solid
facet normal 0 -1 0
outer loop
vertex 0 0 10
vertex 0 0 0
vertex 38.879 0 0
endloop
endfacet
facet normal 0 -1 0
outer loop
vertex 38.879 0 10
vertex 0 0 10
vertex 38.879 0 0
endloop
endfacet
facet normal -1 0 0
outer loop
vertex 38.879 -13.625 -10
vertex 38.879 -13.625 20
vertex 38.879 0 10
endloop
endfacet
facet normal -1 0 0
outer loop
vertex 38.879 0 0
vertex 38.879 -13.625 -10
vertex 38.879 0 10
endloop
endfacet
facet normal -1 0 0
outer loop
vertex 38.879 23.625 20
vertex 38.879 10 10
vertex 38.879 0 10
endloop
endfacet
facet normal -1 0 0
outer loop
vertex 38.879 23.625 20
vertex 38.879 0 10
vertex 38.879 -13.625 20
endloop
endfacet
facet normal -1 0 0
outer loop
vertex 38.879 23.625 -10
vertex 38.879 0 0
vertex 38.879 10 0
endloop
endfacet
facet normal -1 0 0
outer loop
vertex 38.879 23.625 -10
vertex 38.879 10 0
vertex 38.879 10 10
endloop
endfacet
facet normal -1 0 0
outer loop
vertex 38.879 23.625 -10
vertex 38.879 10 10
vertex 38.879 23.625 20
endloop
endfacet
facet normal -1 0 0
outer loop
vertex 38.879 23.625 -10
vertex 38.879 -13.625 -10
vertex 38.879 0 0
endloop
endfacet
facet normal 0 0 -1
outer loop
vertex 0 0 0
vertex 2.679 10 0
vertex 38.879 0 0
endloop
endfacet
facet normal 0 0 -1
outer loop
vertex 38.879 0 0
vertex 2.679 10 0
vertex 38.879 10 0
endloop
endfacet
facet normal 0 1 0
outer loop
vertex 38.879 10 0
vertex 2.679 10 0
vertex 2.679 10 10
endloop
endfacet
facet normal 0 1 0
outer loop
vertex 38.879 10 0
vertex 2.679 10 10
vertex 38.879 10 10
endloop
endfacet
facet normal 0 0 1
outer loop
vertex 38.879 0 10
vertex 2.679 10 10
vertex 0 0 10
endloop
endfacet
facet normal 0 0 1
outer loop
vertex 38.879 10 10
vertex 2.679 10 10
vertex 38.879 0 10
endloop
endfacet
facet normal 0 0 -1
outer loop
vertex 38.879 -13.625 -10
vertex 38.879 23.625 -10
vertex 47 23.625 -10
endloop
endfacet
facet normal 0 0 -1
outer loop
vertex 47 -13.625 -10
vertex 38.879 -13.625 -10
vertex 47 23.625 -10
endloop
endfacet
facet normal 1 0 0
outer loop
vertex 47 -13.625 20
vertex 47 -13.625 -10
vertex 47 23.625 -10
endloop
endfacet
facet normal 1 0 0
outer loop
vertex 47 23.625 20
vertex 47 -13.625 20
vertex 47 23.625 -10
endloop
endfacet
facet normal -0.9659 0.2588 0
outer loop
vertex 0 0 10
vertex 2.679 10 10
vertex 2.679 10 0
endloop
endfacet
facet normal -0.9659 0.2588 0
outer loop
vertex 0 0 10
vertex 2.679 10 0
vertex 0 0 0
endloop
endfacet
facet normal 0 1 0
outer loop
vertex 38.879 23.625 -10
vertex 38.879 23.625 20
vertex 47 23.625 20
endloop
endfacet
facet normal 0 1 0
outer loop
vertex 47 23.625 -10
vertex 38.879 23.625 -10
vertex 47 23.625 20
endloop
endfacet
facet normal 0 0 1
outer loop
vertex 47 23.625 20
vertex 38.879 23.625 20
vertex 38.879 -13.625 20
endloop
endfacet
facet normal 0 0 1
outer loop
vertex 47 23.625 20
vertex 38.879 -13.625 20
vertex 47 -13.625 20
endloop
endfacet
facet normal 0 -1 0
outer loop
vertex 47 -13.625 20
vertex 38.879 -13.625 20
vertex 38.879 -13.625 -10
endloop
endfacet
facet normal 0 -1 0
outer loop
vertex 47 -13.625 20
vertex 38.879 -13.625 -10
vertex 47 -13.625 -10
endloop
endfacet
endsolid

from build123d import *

# Parameters (mm, degrees)
SKETCH1_W                = 47
SKETCH1_H                = 10
BOSS_EXTRUDE1_DEPTH      = 10
BOSS_EXTRUDE3_DEPTH      = 15
BOSS_EXTRUDE3_DEPTH_BACK = 15
SKETCH5_W                = 8.120903277
SKETCH5_H                = 37.25
CUT_EXTRUDE1_DEPTH       = 57.27735446


with BuildPart() as part:
    # Sketch1 → Boss-Extrude1 (new body)
    with BuildSketch(Plane.XY):
        with Locations((23.5, 5)):
            Rectangle(SKETCH1_W, SKETCH1_H)
    extrude(amount=BOSS_EXTRUDE1_DEPTH)

    # Sketch5 → Boss-Extrude3 (add, two sides: drawn at the far end of the back side and taken through both)
    with BuildSketch(Plane.XY.offset(5).offset(-BOSS_EXTRUDE3_DEPTH_BACK)):
        with Locations((42.939548362, 5)):
            Rectangle(SKETCH5_W, SKETCH5_H)
    extrude(amount=BOSS_EXTRUDE3_DEPTH + BOSS_EXTRUDE3_DEPTH_BACK)

    # Sketch6 → Cut-Extrude1 (cut, through all)
    with BuildSketch(Plane.XY.offset(10)):
        Polygon((0, 10), (2.679491924, 10), (0, 0), align=None)
    extrude(amount=-CUT_EXTRUDE1_DEPTH, mode=Mode.SUBTRACT)


solid = part.part
